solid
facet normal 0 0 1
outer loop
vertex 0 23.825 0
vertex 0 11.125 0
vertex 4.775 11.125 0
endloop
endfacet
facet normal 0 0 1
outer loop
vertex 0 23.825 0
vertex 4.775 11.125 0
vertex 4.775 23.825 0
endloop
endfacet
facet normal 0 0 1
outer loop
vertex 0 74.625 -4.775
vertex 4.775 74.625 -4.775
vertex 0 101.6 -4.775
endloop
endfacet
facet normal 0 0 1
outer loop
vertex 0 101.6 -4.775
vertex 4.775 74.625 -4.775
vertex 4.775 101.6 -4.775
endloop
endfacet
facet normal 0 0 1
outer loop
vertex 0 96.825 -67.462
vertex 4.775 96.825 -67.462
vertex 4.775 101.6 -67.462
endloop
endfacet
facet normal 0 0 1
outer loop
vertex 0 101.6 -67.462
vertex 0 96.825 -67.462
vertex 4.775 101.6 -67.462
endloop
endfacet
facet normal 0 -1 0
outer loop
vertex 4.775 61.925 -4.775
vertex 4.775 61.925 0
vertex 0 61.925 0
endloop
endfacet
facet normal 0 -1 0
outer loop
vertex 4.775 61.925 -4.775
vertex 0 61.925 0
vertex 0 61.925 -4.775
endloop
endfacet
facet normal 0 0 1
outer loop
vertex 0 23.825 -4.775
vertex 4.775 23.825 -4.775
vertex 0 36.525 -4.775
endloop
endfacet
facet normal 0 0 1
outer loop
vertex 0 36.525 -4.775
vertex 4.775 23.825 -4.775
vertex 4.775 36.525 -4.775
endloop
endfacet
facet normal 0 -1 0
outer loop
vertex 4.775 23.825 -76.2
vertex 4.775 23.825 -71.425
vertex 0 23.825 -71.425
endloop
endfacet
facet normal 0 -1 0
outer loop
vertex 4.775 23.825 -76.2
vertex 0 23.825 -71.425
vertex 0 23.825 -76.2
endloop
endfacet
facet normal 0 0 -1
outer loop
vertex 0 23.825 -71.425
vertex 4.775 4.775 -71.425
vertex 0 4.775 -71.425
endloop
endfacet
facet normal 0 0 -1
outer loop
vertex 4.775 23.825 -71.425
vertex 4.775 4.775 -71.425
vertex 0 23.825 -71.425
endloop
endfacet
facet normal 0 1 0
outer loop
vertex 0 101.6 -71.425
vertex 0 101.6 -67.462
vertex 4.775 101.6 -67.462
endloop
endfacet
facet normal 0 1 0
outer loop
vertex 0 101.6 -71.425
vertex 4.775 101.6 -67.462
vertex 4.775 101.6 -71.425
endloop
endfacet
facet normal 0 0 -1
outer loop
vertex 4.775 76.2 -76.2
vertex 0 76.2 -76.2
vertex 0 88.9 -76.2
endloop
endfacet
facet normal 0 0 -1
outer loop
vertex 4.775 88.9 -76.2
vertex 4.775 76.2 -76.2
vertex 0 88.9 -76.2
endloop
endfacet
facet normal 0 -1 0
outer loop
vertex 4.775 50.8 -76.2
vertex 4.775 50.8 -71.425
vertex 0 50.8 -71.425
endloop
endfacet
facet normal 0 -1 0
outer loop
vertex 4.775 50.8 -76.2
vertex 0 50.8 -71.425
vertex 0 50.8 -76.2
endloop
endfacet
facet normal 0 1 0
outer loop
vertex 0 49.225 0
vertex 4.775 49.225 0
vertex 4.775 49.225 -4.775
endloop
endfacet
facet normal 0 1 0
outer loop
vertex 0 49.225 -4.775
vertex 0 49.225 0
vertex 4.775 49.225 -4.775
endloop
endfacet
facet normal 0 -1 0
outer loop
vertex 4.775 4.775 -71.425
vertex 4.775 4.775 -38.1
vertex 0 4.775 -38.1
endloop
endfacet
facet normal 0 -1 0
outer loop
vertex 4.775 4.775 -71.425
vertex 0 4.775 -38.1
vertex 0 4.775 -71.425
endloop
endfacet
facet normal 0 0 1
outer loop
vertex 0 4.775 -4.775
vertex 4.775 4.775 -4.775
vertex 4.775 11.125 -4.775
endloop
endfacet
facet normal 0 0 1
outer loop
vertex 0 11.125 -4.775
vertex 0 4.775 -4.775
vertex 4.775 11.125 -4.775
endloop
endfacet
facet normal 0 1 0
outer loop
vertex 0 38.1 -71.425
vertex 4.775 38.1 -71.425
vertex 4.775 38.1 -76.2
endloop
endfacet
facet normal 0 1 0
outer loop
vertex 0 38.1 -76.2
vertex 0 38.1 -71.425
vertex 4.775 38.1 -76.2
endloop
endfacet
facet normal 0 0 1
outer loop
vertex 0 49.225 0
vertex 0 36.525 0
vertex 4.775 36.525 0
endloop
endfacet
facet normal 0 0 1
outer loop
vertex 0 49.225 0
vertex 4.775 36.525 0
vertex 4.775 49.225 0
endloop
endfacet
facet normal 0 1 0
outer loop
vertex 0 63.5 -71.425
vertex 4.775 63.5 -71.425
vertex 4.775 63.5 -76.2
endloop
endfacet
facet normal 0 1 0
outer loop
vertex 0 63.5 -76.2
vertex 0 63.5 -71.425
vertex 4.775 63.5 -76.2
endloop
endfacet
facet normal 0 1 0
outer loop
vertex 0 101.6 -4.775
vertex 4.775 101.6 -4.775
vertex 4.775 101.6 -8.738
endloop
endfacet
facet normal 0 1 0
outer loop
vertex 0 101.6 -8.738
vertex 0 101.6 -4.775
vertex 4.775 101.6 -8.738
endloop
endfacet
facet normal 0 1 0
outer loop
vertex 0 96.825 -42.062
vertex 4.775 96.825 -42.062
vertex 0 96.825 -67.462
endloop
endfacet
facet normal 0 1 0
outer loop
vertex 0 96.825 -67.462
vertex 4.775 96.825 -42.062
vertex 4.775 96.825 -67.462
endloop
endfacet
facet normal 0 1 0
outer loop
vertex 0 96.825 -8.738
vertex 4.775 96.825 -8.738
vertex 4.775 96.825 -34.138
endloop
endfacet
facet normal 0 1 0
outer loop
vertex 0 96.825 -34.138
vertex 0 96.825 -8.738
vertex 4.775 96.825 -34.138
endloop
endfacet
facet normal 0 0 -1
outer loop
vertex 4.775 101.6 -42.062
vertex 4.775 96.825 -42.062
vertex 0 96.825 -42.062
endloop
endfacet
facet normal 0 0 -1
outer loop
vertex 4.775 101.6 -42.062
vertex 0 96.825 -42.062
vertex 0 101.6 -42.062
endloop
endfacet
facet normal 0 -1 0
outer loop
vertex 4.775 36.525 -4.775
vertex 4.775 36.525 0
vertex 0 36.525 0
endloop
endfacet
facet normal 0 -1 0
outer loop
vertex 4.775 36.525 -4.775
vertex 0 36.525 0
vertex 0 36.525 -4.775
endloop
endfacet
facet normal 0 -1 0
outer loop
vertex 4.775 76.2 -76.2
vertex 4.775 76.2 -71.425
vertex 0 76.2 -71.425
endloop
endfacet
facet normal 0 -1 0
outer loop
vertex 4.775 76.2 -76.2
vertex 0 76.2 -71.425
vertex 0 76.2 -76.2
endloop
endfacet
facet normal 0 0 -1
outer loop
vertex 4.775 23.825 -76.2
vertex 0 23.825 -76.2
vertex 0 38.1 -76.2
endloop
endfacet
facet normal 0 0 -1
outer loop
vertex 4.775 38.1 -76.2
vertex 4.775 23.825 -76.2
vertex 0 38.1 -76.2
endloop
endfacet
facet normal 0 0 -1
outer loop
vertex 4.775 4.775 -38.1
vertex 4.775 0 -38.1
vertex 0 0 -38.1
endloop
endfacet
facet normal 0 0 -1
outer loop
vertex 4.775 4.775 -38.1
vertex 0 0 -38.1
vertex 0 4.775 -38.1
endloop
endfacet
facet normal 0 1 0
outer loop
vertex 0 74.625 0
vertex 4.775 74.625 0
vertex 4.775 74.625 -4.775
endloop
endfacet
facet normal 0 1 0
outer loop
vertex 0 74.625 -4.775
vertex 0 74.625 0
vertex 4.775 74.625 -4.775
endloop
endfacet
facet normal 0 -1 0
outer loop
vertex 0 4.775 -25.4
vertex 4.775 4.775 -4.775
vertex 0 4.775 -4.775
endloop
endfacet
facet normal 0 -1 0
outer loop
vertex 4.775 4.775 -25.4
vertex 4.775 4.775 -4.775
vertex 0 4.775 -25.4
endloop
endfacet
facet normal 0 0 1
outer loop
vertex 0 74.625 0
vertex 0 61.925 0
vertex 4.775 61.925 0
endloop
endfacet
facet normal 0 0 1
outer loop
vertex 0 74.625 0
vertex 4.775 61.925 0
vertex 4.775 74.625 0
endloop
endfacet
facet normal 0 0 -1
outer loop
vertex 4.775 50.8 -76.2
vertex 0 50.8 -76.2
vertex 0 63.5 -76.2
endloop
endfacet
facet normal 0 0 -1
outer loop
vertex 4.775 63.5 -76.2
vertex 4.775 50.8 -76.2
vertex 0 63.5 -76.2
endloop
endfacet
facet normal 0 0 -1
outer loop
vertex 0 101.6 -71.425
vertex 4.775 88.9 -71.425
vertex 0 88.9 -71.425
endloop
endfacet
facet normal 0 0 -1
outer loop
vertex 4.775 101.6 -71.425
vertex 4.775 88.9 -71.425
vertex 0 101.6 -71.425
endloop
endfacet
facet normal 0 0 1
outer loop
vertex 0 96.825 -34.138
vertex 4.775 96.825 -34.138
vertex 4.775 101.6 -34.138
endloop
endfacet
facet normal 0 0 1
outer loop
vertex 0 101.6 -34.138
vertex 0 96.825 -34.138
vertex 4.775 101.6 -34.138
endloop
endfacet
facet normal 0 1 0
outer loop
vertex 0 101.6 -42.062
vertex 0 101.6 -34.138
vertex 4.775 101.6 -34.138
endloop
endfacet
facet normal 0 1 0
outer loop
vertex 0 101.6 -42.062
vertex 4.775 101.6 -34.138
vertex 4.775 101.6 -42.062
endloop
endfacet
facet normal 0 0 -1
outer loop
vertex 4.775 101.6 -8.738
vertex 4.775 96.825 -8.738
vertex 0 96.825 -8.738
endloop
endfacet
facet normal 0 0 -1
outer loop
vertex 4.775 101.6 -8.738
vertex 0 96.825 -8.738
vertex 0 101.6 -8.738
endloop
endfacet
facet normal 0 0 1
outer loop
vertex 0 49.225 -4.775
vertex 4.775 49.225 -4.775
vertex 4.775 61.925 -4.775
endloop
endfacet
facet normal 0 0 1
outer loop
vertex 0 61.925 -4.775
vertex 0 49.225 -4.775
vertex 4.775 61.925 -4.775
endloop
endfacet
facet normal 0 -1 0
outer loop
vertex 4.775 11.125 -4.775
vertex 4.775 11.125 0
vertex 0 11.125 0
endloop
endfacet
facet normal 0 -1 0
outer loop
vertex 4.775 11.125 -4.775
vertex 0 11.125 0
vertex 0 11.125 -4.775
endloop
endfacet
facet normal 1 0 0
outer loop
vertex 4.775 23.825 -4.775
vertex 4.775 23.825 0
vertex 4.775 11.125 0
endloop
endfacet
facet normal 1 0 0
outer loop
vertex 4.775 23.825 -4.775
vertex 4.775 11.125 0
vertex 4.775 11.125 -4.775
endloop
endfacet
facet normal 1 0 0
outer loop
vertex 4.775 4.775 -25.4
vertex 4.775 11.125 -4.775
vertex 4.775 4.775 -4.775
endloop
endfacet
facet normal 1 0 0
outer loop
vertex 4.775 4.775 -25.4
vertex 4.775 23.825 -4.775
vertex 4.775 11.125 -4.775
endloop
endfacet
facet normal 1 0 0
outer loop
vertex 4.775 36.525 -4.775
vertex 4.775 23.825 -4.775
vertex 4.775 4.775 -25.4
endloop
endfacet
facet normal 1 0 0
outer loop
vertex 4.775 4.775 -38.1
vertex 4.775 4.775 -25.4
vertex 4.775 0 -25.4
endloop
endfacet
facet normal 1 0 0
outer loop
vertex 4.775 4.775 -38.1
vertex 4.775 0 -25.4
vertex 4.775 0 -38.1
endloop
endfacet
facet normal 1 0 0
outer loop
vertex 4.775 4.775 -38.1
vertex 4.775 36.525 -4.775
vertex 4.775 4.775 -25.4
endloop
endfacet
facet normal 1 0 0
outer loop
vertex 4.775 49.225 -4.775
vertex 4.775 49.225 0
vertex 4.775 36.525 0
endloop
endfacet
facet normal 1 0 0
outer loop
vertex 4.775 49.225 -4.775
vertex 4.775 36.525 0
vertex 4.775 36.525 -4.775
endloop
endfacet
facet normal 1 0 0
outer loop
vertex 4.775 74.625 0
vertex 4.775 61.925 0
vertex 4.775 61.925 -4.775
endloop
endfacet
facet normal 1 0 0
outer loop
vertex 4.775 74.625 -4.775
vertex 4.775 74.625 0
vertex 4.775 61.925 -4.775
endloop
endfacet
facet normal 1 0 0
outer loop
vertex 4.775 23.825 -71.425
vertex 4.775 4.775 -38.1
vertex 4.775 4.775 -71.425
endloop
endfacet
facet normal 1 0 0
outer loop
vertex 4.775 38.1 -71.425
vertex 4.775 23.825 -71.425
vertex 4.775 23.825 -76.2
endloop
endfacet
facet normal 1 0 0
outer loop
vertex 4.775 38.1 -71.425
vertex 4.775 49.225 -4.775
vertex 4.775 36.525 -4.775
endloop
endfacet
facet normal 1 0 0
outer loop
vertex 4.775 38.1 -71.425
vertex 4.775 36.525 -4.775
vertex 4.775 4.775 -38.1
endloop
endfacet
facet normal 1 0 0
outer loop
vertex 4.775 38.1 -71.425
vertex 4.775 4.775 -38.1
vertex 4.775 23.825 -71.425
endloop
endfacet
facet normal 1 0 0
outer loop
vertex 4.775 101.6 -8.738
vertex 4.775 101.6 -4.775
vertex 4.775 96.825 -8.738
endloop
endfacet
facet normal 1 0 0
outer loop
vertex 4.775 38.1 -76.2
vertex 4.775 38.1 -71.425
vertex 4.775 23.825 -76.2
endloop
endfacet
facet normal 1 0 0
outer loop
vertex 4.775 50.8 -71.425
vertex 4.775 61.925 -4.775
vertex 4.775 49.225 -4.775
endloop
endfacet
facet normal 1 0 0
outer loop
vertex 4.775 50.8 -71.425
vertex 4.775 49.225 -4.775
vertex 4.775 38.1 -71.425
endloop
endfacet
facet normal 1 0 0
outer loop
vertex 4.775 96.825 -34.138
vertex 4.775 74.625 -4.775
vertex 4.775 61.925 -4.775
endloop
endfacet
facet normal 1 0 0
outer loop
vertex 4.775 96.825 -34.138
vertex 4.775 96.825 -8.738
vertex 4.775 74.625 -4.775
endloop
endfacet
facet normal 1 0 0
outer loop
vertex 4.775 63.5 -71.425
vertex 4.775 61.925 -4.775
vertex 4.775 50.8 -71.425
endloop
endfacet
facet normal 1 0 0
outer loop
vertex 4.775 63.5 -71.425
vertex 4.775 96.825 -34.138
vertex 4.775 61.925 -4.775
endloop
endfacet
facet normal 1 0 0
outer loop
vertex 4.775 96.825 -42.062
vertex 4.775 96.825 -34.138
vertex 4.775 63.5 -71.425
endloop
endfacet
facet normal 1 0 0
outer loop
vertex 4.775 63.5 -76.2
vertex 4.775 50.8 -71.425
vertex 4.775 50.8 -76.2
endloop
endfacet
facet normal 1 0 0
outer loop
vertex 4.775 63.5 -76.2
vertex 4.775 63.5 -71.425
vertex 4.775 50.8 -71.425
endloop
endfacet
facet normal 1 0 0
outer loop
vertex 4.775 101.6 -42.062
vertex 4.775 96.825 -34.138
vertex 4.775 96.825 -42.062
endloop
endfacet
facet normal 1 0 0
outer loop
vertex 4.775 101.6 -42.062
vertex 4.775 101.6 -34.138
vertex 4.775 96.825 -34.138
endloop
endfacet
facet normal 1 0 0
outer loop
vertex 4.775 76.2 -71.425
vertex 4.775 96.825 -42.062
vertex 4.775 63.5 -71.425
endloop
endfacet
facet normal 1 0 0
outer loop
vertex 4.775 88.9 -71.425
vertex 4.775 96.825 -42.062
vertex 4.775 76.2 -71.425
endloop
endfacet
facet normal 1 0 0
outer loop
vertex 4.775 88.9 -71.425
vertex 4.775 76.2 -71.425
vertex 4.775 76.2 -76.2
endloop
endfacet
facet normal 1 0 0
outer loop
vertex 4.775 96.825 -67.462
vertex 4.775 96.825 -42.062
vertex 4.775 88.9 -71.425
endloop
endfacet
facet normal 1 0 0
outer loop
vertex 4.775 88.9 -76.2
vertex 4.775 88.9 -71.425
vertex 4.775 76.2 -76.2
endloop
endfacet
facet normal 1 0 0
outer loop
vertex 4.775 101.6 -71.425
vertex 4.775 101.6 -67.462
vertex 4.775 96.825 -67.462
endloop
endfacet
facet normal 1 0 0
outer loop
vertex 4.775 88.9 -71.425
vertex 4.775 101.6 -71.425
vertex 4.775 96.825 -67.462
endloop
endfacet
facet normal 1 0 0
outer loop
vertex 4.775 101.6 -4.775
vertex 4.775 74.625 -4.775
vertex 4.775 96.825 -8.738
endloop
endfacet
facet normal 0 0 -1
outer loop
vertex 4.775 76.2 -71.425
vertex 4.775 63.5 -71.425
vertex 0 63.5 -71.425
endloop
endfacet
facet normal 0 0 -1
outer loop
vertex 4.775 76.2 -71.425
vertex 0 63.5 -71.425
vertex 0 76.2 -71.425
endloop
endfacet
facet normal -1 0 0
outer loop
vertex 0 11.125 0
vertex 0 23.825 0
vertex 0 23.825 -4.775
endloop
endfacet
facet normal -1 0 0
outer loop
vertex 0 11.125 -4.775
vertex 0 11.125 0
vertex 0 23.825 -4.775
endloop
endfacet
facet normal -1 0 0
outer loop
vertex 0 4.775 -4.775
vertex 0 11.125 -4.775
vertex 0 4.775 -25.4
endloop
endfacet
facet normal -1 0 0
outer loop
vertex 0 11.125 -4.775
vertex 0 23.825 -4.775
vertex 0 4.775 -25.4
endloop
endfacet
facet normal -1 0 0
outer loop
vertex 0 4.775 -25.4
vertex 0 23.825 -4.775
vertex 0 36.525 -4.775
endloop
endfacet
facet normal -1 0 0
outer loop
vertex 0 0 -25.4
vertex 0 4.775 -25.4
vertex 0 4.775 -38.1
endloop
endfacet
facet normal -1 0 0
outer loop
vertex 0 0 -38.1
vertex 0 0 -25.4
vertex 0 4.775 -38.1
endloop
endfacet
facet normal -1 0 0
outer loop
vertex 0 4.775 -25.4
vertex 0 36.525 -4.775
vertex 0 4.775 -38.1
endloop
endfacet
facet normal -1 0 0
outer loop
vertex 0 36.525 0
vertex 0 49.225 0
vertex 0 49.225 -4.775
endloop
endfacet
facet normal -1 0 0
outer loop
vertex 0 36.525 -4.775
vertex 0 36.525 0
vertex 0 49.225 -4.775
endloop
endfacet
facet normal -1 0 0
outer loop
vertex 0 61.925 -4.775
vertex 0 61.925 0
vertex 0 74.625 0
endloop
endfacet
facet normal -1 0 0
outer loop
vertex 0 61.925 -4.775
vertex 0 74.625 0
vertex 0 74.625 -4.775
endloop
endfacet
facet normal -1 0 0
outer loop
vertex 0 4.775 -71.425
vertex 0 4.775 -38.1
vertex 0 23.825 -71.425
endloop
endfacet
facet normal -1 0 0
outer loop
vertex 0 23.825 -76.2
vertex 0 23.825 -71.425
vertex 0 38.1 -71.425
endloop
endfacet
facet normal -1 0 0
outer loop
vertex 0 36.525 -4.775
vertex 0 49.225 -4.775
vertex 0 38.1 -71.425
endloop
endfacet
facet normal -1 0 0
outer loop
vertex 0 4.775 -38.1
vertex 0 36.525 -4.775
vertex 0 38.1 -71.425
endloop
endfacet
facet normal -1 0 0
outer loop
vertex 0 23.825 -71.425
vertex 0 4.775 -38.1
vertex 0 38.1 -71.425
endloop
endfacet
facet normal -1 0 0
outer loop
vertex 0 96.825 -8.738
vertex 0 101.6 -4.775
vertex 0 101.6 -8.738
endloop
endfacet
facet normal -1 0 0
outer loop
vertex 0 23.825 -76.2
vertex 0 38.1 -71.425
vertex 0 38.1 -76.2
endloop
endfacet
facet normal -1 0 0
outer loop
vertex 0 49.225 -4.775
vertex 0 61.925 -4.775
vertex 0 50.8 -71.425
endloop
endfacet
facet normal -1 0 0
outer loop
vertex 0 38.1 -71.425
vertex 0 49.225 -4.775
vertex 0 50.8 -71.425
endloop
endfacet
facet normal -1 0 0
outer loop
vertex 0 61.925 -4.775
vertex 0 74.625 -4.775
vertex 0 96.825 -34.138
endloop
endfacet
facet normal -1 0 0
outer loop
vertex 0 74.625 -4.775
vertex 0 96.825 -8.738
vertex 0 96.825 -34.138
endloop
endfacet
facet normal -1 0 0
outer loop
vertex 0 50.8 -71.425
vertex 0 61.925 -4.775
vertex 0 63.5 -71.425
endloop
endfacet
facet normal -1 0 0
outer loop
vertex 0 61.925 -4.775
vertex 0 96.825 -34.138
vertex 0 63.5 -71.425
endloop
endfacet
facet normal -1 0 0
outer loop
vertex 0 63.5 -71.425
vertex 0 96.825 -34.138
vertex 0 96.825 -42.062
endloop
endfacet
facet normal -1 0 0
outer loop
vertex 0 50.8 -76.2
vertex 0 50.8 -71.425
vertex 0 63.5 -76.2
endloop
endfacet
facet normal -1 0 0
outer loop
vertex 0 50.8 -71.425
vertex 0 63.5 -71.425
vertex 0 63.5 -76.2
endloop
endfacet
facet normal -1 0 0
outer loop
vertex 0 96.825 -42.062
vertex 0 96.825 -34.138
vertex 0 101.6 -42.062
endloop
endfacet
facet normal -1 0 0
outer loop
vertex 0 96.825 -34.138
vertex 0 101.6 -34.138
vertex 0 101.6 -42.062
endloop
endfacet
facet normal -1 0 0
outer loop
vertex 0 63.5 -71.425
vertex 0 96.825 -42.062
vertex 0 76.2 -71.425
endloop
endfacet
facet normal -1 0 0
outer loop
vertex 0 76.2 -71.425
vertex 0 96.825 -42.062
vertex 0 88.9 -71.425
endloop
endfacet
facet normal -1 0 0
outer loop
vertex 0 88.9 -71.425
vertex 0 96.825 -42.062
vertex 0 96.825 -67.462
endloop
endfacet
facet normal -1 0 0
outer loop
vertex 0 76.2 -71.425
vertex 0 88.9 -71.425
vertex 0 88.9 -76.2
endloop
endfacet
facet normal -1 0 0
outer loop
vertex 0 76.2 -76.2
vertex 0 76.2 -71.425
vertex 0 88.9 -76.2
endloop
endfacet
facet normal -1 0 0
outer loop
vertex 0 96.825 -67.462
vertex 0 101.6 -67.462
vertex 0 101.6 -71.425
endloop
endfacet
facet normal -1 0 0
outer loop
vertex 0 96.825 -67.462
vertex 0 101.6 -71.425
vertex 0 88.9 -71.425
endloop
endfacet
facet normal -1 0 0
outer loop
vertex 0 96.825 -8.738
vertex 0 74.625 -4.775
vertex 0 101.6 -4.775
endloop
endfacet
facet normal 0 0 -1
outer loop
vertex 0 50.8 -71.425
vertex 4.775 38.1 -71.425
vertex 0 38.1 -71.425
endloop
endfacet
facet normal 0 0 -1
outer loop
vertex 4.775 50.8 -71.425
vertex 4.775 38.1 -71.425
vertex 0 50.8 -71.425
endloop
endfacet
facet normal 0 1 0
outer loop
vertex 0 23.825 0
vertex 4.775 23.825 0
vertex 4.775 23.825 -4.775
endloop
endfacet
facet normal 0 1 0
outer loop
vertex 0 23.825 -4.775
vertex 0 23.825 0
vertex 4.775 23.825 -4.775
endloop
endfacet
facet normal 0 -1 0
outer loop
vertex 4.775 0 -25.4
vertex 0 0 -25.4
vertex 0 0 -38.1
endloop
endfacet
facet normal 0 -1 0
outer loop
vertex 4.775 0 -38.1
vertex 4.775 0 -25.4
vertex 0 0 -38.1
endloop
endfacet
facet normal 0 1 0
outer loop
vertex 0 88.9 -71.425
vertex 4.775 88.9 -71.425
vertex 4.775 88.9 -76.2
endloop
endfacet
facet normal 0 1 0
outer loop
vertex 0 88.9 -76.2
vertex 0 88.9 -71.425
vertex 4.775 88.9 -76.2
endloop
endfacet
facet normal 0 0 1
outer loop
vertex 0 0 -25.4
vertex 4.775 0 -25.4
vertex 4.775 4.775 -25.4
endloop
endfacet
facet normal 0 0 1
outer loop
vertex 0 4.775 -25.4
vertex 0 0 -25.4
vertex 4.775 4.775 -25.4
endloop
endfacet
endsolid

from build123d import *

# Parameters (mm, degrees)
SKETCH2_W           = 76.2
SKETCH2_H           = 101.6
BOSS_EXTRUDE1_DEPTH = 4.7752
SKETCH3_W           = 25.4
SKETCH3_H           = 4.7752
SKETCH3_W_2         = 38.1
CUT_EXTRUDE1_DEPTH  = 6.35
SKETCH4_W           = 4.7752
SKETCH4_H           = 26.9748
SKETCH4_H_2         = 12.7
SKETCH4_H_3         = 6.35
SKETCH4_H_4         = 19.05
CUT_EXTRUDE2_DEPTH  = 6.35
SKETCH6_W           = 12.7
SKETCH6_H           = 4.775408317
CUT_EXTRUDE4_DEPTH  = 4.7752


with BuildPart() as part:
    # Sketch2 → Boss-Extrude1 (new body)
    with BuildSketch(Plane(origin=(0, 0, 0), x_dir=(0, 0, -1), z_dir=(1, 0, 0))):
        with Locations((38.1, 50.8)):
            Rectangle(SKETCH2_W, SKETCH2_H)
    extrude(amount=BOSS_EXTRUDE1_DEPTH)

    # Sketch3 → Cut-Extrude1 (cut)
    with BuildSketch(Plane(origin=(4.7752, 0, 0), x_dir=(0, 0, -1), z_dir=(1, 0, 0))):
        with Locations((12.7, 2.3876)):
            Rectangle(SKETCH3_W, SKETCH3_H)
        with Locations((57.15, 2.3876)):
            Rectangle(SKETCH3_W_2, SKETCH3_H)
    extrude(amount=-CUT_EXTRUDE1_DEPTH, mode=Mode.SUBTRACT)

    # Sketch4 → Cut-Extrude2 (cut)
    with BuildSketch(Plane(origin=(4.7752, 0, 0), x_dir=(0, 0, -1), z_dir=(1, 0, 0))):
        with Locations((2.3876, 88.1126)):
            Rectangle(SKETCH4_W, SKETCH4_H)
        with Locations((73.8124, 95.25)):
            Rectangle(SKETCH4_W, SKETCH4_H_2)
        with Locations((73.8124, 69.85)):
            Rectangle(SKETCH4_W, SKETCH4_H_2)
        with Locations((2.3876, 7.9502)):
            Rectangle(SKETCH4_W, SKETCH4_H_3)
        with Locations((73.8124, 14.3002)):
            Rectangle(SKETCH4_W, SKETCH4_H_4)
        with Locations((73.8124, 44.45)):
            Rectangle(SKETCH4_W, SKETCH4_H_2)
        with Locations((2.3876, 55.5752)):
            Rectangle(SKETCH4_W, SKETCH4_H_2)
        with Locations((2.3876, 30.1752)):
            Rectangle(SKETCH4_W, SKETCH4_H_2)
    extrude(amount=-CUT_EXTRUDE2_DEPTH, mode=Mode.SUBTRACT)

    # Sketch6 → Cut-Extrude4 (cut)
    with BuildSketch(Plane(origin=(4.7752, 0, 0), x_dir=(0, 0, -1), z_dir=(1, 0, 0))):
        with Locations((27.7876, 99.212295842)):
            Rectangle(SKETCH6_W, SKETCH6_H)
        with Locations((15.0876, 99.212295842)):
            Rectangle(SKETCH6_W, SKETCH6_H)
        with Locations((48.4124, 99.212295842)):
            Rectangle(SKETCH6_W, SKETCH6_H)
        with Locations((61.1124, 99.212295842)):
            Rectangle(SKETCH6_W, SKETCH6_H)
    extrude(amount=-CUT_EXTRUDE4_DEPTH, mode=Mode.SUBTRACT)


solid = part.part
